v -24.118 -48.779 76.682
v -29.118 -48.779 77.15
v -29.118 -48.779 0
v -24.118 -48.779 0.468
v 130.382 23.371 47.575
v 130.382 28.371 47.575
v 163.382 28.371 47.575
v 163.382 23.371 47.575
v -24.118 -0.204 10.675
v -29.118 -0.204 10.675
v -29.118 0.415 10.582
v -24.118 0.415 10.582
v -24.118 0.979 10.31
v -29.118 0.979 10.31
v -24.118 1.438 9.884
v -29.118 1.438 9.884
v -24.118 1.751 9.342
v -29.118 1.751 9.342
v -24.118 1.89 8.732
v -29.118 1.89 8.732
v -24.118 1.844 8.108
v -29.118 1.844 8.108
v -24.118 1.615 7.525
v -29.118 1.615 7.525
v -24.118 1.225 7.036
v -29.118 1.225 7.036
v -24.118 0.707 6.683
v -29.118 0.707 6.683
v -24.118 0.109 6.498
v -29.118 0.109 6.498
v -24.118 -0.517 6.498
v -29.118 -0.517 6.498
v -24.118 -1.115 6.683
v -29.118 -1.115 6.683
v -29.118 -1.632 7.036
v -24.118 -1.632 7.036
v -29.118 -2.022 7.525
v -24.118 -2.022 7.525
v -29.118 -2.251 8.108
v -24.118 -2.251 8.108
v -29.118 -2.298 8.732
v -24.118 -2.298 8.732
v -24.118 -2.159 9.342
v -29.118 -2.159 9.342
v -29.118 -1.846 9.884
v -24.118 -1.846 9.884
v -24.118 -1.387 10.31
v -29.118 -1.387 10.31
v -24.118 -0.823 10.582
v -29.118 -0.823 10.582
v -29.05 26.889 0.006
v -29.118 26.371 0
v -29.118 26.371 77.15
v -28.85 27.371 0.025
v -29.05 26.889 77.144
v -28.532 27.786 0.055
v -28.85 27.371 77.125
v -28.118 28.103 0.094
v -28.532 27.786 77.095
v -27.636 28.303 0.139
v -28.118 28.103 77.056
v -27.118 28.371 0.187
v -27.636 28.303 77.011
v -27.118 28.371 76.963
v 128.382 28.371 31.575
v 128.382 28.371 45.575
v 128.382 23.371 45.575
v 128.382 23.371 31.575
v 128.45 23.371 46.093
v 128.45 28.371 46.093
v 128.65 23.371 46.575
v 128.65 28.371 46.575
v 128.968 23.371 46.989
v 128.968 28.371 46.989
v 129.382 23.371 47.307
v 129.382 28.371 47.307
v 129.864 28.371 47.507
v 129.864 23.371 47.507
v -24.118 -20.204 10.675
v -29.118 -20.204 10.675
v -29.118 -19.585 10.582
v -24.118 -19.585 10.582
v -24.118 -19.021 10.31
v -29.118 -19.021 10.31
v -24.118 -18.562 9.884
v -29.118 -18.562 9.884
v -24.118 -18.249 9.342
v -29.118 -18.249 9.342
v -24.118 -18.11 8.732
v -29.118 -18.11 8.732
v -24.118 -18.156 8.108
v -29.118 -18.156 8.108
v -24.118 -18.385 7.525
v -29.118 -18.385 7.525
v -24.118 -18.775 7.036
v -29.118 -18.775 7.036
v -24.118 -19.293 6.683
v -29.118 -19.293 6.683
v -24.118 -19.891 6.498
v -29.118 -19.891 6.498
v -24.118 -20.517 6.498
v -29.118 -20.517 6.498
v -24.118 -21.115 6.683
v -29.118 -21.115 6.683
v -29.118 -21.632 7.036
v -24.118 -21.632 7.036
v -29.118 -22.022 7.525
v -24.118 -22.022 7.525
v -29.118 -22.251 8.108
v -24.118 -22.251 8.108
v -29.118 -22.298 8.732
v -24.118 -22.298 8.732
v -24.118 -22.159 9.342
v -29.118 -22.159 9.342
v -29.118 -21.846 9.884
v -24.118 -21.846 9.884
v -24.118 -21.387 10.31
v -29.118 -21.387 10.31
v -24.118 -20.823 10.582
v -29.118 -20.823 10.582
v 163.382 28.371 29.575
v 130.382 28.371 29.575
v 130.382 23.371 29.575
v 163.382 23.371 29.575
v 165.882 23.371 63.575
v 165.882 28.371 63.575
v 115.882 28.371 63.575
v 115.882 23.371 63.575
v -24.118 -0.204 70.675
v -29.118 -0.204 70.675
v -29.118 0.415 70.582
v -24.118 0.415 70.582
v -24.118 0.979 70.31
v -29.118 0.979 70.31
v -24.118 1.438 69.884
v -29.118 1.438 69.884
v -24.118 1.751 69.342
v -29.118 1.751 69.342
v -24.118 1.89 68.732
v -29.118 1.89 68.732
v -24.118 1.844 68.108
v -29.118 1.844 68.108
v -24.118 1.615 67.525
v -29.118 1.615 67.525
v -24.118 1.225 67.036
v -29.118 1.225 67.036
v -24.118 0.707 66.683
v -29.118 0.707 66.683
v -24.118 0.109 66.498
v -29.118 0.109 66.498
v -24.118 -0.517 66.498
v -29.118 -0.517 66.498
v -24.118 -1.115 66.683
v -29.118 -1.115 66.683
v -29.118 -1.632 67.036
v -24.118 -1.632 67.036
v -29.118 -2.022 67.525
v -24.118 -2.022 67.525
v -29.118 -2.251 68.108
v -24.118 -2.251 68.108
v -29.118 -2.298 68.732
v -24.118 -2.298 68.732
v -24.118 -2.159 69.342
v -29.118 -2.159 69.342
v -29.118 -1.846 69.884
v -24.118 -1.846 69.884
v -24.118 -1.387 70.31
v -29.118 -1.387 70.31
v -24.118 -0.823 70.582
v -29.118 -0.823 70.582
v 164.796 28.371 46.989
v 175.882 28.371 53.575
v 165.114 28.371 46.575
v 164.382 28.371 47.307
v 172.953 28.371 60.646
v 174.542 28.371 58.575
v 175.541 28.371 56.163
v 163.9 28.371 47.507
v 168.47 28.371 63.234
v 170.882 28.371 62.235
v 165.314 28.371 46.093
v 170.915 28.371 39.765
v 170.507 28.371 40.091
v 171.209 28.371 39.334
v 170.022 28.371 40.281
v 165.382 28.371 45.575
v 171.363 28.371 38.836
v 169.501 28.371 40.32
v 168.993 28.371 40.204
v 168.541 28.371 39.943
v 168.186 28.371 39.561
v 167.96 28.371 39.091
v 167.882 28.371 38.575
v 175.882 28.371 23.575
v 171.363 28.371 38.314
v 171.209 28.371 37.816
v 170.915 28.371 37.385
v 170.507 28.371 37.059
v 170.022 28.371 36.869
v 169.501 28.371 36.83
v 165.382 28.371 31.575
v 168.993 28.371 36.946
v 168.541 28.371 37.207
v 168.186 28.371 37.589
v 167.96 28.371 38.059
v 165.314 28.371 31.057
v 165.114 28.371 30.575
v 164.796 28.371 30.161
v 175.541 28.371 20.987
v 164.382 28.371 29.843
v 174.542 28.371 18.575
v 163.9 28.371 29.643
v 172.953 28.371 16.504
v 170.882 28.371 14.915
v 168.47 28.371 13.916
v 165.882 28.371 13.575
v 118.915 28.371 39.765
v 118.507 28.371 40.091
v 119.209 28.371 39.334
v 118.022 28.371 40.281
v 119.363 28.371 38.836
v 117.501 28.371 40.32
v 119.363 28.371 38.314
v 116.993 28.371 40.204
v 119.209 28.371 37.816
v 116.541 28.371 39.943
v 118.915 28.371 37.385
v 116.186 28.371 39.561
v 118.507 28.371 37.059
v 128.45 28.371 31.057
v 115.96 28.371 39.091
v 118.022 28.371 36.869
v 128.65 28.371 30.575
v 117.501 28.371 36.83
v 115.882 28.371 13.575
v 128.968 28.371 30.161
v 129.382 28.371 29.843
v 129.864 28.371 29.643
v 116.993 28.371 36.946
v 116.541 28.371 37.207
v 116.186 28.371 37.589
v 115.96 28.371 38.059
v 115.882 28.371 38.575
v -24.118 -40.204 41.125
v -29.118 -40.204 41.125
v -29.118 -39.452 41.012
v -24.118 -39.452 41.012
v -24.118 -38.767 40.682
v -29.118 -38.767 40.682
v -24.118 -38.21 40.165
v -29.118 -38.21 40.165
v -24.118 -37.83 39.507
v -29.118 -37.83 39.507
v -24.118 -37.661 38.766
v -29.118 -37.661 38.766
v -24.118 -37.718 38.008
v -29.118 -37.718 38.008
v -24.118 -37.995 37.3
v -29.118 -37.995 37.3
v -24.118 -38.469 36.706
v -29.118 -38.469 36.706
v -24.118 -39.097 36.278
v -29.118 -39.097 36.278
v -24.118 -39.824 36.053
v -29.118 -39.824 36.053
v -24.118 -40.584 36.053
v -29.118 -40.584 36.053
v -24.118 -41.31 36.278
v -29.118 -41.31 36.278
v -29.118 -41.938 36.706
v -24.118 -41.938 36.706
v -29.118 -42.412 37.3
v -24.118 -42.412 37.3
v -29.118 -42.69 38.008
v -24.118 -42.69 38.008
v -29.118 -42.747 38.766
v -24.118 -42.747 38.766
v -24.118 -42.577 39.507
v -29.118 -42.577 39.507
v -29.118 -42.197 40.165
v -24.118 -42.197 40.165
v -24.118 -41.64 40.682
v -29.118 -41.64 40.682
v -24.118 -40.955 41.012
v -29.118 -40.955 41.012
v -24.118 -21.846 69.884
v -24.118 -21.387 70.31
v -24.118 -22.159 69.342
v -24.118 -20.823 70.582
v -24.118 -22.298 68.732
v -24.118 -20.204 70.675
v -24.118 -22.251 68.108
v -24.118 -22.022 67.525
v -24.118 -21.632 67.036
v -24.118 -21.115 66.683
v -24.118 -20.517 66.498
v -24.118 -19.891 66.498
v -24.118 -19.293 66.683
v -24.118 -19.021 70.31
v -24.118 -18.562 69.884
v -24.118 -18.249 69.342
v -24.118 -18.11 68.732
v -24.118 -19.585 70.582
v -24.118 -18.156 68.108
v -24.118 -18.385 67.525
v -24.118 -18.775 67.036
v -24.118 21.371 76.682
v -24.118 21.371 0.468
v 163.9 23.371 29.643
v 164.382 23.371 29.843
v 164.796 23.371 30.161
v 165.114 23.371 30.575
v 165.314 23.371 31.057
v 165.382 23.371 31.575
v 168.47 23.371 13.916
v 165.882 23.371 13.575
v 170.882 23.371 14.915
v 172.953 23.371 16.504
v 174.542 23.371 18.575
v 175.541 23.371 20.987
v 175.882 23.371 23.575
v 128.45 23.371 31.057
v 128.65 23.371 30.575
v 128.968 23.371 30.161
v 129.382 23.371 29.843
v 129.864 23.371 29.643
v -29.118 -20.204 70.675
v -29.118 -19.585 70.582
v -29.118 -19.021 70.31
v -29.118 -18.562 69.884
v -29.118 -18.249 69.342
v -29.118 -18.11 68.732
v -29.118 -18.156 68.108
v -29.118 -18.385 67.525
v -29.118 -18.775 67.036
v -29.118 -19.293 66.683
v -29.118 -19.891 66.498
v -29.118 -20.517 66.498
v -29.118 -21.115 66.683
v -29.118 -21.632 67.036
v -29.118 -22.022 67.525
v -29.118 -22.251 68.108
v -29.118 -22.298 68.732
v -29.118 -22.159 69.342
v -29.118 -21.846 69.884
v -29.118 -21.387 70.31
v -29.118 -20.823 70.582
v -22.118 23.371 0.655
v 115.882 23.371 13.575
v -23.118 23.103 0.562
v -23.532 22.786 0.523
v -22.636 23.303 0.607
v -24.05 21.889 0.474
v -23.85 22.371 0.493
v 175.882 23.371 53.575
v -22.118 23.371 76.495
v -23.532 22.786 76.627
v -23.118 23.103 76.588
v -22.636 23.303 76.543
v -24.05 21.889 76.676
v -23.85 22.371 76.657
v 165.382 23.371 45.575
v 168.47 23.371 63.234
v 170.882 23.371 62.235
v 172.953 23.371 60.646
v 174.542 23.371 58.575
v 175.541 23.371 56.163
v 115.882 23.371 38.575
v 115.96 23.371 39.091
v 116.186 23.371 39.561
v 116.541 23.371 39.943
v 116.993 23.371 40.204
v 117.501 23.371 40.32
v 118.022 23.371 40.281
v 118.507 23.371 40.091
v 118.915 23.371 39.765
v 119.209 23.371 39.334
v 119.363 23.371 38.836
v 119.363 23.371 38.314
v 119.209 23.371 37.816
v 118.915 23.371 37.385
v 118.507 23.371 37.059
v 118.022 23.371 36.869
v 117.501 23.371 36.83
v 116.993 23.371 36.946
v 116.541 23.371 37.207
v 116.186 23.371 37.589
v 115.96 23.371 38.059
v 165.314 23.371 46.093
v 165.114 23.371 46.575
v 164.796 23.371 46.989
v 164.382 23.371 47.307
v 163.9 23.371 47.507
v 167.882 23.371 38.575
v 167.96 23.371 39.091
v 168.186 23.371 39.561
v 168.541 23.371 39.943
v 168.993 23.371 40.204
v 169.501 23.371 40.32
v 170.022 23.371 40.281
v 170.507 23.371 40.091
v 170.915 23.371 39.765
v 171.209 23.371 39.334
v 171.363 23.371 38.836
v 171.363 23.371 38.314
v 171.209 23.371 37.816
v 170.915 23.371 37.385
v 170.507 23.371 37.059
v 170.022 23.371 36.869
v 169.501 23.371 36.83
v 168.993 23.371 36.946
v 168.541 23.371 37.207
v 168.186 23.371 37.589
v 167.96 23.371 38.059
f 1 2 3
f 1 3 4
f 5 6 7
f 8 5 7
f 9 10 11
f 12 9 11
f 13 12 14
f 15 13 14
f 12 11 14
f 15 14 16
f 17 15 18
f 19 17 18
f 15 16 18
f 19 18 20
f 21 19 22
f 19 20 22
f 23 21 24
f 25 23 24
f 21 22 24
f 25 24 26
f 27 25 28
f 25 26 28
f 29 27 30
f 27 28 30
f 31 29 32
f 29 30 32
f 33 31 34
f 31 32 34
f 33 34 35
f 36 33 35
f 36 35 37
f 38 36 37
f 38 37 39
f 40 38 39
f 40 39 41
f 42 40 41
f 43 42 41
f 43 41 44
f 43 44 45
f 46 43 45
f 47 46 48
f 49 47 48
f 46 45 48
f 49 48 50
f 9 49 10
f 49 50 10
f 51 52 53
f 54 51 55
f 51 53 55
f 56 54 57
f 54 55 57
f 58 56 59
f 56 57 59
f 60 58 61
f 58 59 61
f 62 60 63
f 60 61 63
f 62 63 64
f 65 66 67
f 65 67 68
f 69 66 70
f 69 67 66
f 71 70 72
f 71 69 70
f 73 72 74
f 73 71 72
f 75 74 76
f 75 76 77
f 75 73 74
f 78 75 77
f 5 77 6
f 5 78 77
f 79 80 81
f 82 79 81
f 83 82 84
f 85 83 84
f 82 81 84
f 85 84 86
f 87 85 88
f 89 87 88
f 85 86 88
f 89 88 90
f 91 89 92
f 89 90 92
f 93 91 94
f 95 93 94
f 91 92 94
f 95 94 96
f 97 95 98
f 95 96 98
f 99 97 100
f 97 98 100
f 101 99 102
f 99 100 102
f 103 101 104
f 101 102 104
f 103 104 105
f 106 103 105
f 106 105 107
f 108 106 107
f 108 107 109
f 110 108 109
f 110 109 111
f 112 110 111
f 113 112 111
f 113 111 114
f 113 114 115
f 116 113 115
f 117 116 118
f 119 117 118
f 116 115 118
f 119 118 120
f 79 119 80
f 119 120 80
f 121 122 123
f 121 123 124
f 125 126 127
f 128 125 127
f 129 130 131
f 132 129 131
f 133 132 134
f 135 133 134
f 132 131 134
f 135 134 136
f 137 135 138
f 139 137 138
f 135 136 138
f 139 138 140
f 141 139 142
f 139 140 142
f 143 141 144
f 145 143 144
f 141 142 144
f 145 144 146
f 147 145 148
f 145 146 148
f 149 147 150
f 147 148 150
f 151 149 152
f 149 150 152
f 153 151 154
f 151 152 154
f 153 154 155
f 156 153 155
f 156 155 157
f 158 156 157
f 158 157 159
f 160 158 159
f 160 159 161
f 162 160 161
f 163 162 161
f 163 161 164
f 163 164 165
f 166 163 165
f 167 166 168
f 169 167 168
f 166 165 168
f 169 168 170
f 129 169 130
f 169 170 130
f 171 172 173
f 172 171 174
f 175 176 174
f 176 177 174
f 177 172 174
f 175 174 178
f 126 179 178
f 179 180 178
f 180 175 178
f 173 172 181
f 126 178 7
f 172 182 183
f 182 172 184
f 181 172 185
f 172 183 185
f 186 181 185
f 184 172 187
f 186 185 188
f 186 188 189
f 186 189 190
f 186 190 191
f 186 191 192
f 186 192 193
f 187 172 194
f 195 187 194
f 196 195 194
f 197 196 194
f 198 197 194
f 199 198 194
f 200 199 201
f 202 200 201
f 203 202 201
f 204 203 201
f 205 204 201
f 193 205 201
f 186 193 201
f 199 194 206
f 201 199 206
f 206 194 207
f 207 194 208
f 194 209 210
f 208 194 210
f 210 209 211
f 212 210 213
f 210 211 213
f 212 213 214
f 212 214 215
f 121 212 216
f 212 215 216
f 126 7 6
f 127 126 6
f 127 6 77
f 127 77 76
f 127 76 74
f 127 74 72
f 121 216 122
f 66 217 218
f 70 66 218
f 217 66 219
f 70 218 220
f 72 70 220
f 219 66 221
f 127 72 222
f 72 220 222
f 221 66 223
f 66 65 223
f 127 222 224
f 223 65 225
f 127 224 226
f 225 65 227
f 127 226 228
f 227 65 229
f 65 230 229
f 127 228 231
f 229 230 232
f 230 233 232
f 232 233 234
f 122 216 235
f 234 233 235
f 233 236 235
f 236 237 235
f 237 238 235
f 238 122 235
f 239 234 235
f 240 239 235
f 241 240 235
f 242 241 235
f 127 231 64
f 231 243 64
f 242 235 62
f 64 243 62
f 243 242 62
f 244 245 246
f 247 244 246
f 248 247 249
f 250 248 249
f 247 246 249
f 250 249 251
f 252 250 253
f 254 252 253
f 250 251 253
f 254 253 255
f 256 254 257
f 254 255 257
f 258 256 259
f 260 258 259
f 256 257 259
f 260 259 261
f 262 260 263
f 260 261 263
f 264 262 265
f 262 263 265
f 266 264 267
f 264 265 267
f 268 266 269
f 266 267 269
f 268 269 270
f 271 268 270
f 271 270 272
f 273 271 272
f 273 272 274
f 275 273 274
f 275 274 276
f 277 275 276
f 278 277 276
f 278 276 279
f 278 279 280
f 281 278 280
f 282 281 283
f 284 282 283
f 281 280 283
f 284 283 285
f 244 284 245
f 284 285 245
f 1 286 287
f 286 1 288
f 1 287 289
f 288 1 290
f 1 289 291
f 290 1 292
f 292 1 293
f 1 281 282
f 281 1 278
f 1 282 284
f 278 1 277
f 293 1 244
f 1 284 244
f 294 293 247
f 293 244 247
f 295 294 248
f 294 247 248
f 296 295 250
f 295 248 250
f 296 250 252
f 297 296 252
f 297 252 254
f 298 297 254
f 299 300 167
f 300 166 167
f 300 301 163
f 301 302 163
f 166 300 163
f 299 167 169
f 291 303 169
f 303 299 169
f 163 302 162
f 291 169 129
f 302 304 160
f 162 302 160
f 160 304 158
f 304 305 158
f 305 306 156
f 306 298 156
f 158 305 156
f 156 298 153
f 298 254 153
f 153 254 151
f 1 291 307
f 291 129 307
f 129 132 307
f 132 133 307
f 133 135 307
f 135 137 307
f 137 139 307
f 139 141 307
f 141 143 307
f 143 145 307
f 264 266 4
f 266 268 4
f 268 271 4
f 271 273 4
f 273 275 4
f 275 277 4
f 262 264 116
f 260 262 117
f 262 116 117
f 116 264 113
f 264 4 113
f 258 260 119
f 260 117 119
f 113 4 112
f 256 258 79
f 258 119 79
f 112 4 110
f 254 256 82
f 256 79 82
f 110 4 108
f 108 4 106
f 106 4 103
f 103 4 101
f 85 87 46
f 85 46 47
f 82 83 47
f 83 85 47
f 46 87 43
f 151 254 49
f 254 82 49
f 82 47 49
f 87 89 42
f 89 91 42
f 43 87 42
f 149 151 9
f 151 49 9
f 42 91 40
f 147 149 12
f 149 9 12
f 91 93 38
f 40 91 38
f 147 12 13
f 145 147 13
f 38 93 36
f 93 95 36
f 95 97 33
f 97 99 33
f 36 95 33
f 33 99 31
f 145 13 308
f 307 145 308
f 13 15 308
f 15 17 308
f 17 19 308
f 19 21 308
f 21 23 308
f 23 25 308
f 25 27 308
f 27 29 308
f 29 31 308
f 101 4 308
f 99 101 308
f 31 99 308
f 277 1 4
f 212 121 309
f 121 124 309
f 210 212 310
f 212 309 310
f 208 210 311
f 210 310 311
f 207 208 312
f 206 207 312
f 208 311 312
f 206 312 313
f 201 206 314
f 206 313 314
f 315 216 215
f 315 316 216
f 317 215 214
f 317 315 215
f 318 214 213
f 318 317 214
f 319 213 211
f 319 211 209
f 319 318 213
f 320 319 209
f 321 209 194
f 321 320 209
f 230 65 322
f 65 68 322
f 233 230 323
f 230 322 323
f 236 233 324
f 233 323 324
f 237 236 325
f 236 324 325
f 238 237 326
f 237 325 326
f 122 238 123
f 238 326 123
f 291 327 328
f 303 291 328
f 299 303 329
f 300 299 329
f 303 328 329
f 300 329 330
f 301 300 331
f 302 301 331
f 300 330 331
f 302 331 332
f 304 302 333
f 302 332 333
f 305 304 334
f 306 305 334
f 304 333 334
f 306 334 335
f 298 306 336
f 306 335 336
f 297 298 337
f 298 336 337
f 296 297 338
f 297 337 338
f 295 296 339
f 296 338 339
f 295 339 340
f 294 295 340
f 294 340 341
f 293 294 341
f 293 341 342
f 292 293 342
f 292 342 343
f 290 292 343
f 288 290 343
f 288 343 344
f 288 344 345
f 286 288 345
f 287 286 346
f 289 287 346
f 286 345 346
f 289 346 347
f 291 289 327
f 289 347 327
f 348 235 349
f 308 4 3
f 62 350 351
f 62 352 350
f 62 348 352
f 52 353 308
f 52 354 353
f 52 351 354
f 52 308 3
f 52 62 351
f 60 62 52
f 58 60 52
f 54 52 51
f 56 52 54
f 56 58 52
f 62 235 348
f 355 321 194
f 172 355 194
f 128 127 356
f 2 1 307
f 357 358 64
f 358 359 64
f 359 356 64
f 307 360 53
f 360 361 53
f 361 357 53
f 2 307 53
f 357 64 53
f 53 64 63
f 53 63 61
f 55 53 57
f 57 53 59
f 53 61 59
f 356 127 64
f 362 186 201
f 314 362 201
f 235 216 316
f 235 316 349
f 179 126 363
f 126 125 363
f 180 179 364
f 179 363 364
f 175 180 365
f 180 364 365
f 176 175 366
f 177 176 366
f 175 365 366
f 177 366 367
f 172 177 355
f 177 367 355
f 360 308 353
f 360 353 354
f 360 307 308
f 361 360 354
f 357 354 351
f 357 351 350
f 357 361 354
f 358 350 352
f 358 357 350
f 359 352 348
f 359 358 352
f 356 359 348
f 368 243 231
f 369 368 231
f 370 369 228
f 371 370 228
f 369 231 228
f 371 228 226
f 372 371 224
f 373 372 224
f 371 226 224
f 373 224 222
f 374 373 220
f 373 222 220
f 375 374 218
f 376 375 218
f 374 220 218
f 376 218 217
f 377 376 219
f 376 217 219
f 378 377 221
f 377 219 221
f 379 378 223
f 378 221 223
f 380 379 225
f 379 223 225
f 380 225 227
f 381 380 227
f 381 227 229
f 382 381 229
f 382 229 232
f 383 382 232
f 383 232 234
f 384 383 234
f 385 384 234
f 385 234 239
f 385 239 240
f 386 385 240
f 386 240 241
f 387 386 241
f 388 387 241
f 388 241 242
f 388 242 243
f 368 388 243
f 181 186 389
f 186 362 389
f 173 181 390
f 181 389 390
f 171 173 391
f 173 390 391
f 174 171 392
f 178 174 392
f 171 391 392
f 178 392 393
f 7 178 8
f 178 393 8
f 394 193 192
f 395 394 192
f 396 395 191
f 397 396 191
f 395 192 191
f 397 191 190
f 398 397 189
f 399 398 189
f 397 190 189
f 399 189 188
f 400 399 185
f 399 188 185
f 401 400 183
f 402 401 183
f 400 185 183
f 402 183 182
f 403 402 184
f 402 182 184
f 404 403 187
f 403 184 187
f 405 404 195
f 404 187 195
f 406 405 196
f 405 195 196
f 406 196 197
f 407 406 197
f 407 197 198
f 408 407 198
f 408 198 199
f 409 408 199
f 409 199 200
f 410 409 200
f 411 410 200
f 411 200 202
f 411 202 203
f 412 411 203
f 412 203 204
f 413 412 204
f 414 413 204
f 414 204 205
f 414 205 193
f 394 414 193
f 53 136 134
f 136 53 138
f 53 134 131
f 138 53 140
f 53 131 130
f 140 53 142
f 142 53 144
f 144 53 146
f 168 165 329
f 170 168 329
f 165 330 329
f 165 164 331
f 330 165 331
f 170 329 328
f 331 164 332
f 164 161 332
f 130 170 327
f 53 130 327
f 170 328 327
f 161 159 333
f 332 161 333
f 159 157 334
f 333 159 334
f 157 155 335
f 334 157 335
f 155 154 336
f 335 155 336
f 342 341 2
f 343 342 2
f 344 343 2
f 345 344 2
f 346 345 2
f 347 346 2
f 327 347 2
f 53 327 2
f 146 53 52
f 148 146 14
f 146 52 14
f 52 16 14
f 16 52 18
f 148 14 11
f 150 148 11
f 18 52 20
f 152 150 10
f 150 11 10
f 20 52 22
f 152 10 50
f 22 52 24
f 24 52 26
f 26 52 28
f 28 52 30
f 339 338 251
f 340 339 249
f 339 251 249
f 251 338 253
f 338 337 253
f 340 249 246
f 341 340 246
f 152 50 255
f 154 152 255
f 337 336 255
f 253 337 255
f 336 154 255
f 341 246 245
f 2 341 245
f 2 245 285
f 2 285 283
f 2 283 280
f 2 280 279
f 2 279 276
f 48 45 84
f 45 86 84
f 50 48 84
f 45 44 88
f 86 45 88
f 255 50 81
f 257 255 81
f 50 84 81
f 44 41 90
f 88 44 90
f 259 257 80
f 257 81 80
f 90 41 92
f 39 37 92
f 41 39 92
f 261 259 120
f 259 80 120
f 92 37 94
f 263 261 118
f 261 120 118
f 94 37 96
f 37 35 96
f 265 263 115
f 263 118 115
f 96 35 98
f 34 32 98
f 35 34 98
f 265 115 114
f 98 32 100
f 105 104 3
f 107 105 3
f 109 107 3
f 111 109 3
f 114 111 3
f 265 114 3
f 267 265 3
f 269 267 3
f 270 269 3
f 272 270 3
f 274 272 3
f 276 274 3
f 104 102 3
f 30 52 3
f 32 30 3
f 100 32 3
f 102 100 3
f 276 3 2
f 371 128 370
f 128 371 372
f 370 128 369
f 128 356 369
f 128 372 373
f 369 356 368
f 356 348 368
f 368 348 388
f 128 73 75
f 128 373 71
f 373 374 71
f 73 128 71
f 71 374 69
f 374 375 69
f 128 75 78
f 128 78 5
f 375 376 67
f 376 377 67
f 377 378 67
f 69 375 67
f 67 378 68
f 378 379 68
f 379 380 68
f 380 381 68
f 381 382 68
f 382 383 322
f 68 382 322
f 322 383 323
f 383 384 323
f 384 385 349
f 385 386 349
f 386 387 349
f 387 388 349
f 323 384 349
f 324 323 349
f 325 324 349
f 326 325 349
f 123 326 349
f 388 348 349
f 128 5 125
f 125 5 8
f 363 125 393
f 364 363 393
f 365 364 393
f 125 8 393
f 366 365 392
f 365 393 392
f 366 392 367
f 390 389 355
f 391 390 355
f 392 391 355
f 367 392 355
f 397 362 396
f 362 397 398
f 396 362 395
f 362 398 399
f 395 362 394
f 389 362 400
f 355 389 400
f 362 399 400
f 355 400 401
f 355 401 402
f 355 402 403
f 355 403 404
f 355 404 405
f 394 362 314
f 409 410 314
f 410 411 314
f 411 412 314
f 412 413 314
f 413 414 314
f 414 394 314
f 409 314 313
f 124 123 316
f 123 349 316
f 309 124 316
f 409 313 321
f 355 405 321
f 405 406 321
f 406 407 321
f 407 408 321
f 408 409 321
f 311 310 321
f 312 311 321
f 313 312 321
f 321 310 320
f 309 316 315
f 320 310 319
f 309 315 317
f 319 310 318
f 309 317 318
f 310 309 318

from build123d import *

# Parameters (mm, degrees)
BOSS_EXTRUDE1_DEPTH = 77.15
CUT_EXTRUDE1_REACH  = 208.975
SKETCH2_R           = 1.75
SKETCH2_W           = 37
SKETCH2_H           = 18
FILLET1_R           = 2
FILLET2_R           = 10
SKETCH6_OUTSIDE_W   = 125.596
SKETCH6_OUTSIDE_H   = 125.596
SKETCH6_OUTSIDE_W_2 = 77.15
SKETCH6_OUTSIDE_H_2 = 77.15
SKETCH6_OUTSIDE_R   = 2.1
SKETCH6_OUTSIDE_R_2 = 2.55
CUT_EXTRUDE2_DEPTH  = 5


with BuildPart() as part:
    # Sketch1 → Boss-Extrude1 (new body)
    with BuildSketch(Plane.XY):
        Polygon((-29.117903226, 28.371290323), (-29.117903226, -48.778709677), (-24.117903226, -48.778709677), (-24.117903226, 23.371290323), (175.882096774, 23.371290323), (175.882096774, 28.371290323), align=None)
    extrude(amount=BOSS_EXTRUDE1_DEPTH)

    # Sketch2 → Cut-Extrude1 (cut, up to next)
    with BuildSketch(Plane(origin=(0, 28.371290323, 0), x_dir=(1, 0, 0), z_dir=(0, 1, 0)), mode=Mode.PRIVATE) as cut_extrude1_sk1:
        with Locations(Location((169.632096774, -38.575, 0), (0, 0, 180))):
            Circle(SKETCH2_R)
    cut_extrude1_tool1 = extrude(cut_extrude1_sk1.sketch, amount=-CUT_EXTRUDE1_REACH, mode=Mode.PRIVATE) & part.part
    # Sketch2 → Cut-Extrude1 (cut, up to next)
    with BuildSketch(Plane(origin=(0, 28.371290323, 0), x_dir=(1, 0, 0), z_dir=(0, 1, 0)), mode=Mode.PRIVATE) as cut_extrude1_sk2:
        with Locations(Location((117.632096774, -38.575, 0), (0, 0, 180))):
            Circle(SKETCH2_R)
    cut_extrude1_tool2 = extrude(cut_extrude1_sk2.sketch, amount=-CUT_EXTRUDE1_REACH, mode=Mode.PRIVATE) & part.part
    # Sketch2 → Cut-Extrude1 (cut, up to next)
    with BuildSketch(Plane(origin=(0, 28.371290323, 0), x_dir=(1, 0, 0), z_dir=(0, 1, 0)), mode=Mode.PRIVATE) as cut_extrude1_sk3:
        Polygon((175.882096774, -13.575), (115.882096774, -13.575), (-29.117903226, 0), (175.882096774, 0), align=None)
    cut_extrude1_tool3 = extrude(cut_extrude1_sk3.sketch, amount=-CUT_EXTRUDE1_REACH, mode=Mode.PRIVATE) & part.part
    # Sketch2 → Cut-Extrude1 (cut, up to next)
    with BuildSketch(Plane(origin=(0, 28.371290323, 0), x_dir=(1, 0, 0), z_dir=(0, 1, 0)), mode=Mode.PRIVATE) as cut_extrude1_sk4:
        Polygon((175.882096774, -63.575), (115.882096774, -63.575), (-29.117903226, -77.15), (175.882096774, -77.15), align=None)
    cut_extrude1_tool4 = extrude(cut_extrude1_sk4.sketch, amount=-CUT_EXTRUDE1_REACH, mode=Mode.PRIVATE) & part.part
    # Sketch2 → Cut-Extrude1 (cut, up to next)
    with BuildSketch(Plane(origin=(0, 28.371290323, 0), x_dir=(1, 0, 0), z_dir=(0, 1, 0)), mode=Mode.PRIVATE) as cut_extrude1_sk5:
        with Locations((146.882096774, -38.575)):
            Rectangle(SKETCH2_W, SKETCH2_H)
    cut_extrude1_tool5 = extrude(cut_extrude1_sk5.sketch, amount=-CUT_EXTRUDE1_REACH, mode=Mode.PRIVATE) & part.part
    add(cut_extrude1_tool1.solids().sort_by_distance((169.632097, 28.37129, 38.575))[0], mode=Mode.SUBTRACT)
    add(cut_extrude1_tool2.solids().sort_by_distance((117.632097, 28.37129, 38.575))[0], mode=Mode.SUBTRACT)
    add(cut_extrude1_tool3.solids().sort_by_distance((103.020462, 28.37129, 5.549528))[0], mode=Mode.SUBTRACT)
    add(cut_extrude1_tool4.solids().sort_by_distance((103.020462, 28.37129, 71.600472))[0], mode=Mode.SUBTRACT)
    add(cut_extrude1_tool5.solids().sort_by_distance((146.882097, 28.37129, 38.575))[0], mode=Mode.SUBTRACT)

    # Fillet1
    fillet1_edges = [part.edges().sort_by_distance(p)[0] for p in [
        (-29.117903226, 28.371290323, 38.575),
        (-24.117903226, 23.371290323, 38.575),
        (128.382096774, 25.871290323, 47.575),
        (128.382096774, 25.871290323, 29.575),
        (165.382096774, 25.871290323, 29.575),
        (165.382096774, 25.871290323, 47.575),
    ]]
    fillet(fillet1_edges, radius=FILLET1_R)

    # Fillet2
    fillet2_edges = [part.edges().sort_by_distance(p)[0] for p in [
        (175.882096774, 25.871290323, 13.575),
        (175.882096774, 25.871290323, 63.575),
    ]]
    fillet(fillet2_edges, radius=FILLET2_R)

    # Sketch6 outside → Cut-Extrude2 (cut)
    # profile 1 of 6: a face of its own
    with BuildSketch(Plane.ZY.offset(29.117903226)):
        with Locations((38.575, -10.204)):
            Rectangle(SKETCH6_OUTSIDE_W, SKETCH6_OUTSIDE_H)
        with Locations((38.575, -10.203709677)):
            Rectangle(SKETCH6_OUTSIDE_W_2, SKETCH6_OUTSIDE_H_2, mode=Mode.SUBTRACT)
    # profile 2 of 6: a face of its own
    with BuildSketch(Plane.ZY.offset(29.117903226)):
        with Locations((8.575, -20.203709677)):
            Circle(SKETCH6_OUTSIDE_R)
    # profile 3 of 6: a face of its own
    with BuildSketch(Plane.ZY.offset(29.117903226)):
        with Locations((8.575, -0.203709677)):
            Circle(SKETCH6_OUTSIDE_R)
    # profile 4 of 6: a face of its own
    with BuildSketch(Plane.ZY.offset(29.117903226)):
        with Locations((38.575, -40.203709677)):
            Circle(SKETCH6_OUTSIDE_R_2)
    # profile 5 of 6: a face of its own
    with BuildSketch(Plane.ZY.offset(29.117903226)):
        with Locations((68.575, -20.203709677)):
            Circle(SKETCH6_OUTSIDE_R)
    # profile 6 of 6: a face of its own
    with BuildSketch(Plane.ZY.offset(29.117903226)):
        with Locations((68.575, -0.203709677)):
            Circle(SKETCH6_OUTSIDE_R)
    extrude(amount=-CUT_EXTRUDE2_DEPTH, mode=Mode.SUBTRACT)


solid = part.part
